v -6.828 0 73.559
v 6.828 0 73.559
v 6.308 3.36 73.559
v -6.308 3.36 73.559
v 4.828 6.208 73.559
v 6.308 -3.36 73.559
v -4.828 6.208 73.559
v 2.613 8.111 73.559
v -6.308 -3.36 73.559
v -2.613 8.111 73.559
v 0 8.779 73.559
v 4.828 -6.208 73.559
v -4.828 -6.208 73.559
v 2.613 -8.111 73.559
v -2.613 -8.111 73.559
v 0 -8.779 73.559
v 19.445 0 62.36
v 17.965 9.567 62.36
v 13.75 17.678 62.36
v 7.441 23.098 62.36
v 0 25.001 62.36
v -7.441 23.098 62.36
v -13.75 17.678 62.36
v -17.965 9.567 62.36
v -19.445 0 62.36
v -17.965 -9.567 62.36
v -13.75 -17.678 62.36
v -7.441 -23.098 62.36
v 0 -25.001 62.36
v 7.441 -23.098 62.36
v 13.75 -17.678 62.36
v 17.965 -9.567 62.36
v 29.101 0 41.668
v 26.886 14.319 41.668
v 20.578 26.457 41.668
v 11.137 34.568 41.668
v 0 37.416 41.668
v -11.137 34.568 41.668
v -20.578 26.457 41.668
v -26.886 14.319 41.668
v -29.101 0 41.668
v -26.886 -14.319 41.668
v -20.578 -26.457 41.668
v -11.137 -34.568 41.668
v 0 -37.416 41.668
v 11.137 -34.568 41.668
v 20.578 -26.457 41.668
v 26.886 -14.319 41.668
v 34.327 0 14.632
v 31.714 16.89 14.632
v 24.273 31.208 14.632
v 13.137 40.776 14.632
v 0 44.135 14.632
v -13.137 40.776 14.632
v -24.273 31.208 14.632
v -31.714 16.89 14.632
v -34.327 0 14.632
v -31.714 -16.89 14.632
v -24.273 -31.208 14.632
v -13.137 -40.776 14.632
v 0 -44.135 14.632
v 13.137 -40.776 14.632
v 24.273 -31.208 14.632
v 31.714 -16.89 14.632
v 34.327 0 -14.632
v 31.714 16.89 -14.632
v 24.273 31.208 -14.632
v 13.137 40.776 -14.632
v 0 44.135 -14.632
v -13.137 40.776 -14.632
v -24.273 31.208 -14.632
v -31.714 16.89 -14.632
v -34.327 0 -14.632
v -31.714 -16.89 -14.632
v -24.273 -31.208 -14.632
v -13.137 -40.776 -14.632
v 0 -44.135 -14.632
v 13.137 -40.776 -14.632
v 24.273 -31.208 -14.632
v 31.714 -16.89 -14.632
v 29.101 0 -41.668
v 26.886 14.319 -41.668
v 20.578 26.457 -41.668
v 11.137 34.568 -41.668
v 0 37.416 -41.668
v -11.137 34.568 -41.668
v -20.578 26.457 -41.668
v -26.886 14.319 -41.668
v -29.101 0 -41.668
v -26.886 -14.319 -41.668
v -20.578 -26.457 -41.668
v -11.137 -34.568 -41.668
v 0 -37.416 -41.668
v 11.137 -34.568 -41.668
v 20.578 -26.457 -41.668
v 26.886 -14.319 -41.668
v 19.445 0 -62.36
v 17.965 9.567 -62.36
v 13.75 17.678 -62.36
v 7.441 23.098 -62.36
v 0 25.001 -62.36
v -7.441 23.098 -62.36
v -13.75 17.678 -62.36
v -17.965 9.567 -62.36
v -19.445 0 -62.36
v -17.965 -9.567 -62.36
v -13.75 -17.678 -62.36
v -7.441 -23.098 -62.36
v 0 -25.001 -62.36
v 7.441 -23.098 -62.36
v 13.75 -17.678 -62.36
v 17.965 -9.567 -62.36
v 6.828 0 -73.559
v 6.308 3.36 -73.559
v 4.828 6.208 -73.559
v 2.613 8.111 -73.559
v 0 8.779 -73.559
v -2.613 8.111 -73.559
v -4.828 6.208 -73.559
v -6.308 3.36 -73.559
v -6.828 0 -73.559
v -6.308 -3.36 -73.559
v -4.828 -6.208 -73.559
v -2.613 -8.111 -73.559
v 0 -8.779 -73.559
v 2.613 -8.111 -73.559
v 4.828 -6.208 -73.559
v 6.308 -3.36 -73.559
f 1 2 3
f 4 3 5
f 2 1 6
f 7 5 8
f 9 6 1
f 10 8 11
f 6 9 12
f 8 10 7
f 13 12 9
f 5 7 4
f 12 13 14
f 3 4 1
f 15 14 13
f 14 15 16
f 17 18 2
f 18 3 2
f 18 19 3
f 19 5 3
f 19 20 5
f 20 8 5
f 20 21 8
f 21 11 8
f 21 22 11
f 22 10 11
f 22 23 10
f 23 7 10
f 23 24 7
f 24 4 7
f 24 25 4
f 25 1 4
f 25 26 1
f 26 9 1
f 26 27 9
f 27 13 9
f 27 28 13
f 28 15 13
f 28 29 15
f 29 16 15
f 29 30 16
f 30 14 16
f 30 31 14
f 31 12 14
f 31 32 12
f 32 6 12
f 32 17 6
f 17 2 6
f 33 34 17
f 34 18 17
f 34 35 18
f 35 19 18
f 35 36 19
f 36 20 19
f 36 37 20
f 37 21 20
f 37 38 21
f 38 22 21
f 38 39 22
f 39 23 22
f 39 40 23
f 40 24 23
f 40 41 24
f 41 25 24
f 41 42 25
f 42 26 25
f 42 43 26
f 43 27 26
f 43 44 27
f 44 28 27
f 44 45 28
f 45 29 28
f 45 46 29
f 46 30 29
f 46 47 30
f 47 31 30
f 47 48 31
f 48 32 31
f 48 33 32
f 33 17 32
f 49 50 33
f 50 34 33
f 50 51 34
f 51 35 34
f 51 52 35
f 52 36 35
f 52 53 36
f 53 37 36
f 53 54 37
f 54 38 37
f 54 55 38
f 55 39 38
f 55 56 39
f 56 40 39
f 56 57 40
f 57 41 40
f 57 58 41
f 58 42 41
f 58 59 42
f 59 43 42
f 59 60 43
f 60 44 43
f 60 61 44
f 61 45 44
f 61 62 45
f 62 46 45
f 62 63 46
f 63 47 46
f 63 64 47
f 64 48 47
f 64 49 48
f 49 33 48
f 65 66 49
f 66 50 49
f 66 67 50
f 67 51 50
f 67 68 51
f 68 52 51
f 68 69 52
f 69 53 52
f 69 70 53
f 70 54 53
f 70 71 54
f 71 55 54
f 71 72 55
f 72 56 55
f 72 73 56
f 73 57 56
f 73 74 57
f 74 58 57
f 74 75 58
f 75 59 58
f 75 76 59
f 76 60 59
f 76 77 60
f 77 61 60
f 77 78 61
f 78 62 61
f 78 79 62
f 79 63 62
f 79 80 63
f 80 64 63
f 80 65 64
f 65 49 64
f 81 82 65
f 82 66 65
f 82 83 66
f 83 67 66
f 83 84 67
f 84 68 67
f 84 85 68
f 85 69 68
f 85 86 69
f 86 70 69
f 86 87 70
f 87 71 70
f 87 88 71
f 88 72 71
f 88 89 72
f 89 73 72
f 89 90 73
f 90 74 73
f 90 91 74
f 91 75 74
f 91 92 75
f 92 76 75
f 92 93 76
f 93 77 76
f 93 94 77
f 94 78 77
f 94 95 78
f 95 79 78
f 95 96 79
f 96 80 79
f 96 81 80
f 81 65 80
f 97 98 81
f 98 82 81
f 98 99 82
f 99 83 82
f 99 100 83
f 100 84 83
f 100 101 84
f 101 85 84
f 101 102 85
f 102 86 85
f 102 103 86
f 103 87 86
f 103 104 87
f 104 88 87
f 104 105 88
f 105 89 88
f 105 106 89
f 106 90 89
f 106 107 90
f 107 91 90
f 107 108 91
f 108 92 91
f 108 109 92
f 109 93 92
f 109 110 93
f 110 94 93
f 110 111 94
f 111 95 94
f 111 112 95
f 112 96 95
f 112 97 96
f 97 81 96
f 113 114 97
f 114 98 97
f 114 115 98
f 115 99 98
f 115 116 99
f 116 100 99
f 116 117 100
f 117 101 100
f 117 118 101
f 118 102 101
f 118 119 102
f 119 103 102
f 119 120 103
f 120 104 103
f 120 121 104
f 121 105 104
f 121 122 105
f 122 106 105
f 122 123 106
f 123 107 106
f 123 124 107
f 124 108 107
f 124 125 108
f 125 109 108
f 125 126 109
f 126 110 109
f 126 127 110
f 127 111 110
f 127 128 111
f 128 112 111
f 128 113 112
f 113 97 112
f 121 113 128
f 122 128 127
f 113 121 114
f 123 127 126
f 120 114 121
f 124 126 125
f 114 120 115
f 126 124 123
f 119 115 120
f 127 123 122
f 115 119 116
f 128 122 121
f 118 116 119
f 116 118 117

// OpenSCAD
// Generated by SolidPython 1.0.1 on 2020-07-29 00:46:47


scale(v = [7, 9, 15]) {
	sphere(r = 5);
}
/***********************************************
*********      SolidPython code:      **********
************************************************
 
# import packages: SolidPython
from solid import *
from solid.utils import *
from itertools import chain, combinations, permutations


class Resize:

    def __init__(self, scad_file):
        self.scad_file = scad_file
        #self.scad_file = import_scad(scad_file)
        # cone/cylinder param:
        self.r1 = 0
        self.r2 = 0
        self.h = 0
        # rectangular prism param:
        self.w = 0
        self.l = 0
        # ellipse param:
        self.r = 0

    # import OpenScad code (file name corresponds to shape)


    # classify shape + parameters
    def assign(self, param1, param2, param3):
        if self.scad_file == 'cone.scad':
            self.r1 = param1
            self.r2 = param2
            self.h = param3
        elif self.scad_file == 'cylinder.scad':
            self.r1 = param1
            self.r2 = param2
            self.h = param3
        elif self.scad_file == 'rectangularPrism.scad':
            self.h = param1
            self.l = param2
            self.w = param3
        else:
            self.r = param1
            self.h = param2

    # resize parameters
    def iterate(self):
        x = range(3, 20, 2)
        i = 1
        if self.scad_file == 'cone.scad':
            tempList = list(permutations(x, 2))
            for temp in tempList:
                param1 = temp[0]
                param2 = temp[1]
                filepath = 'produced_scad_files/' + 'cone' + str(param1) + '_' + str(param2) + '_' + '.scad'
                scad_render_to_file(cylinder(h=param1, r1=param2, r2=0), filepath)

        elif self.scad_file == 'cylinder.scad':
            tempList = list(permutations(x, 3))
            for temp in tempList:
                param1 = temp[0]
                param2 = temp[1]
                filepath = 'produced_scad_files/' + 'cylinder' + str(param1) + '_' + str(param2) + '_' + '.scad'
                scad_render_to_file(cylinder(h=param1, r1=param2, r2=param2), filepath)

        elif self.scad_file == 'rectangularPrism.scad':
            tempList = list(permutations(x, 3))
            for temp in tempList:
                param1 = temp[0]
                param2 = temp[1]
                param3 = temp[2]
                filepath = 'produced_scad_files/' + 'rectangularPrism' + str(param1) + '_' + str(param2) + '_' + str(
                    param3) + '.scad'
                scad_render_to_file(cube(size=(param1, param2, param3)), filepath)

        elif self.scad_file == 'ellipse.scad':
            tempList = list(permutations(x, 4))
            for temp in tempList:
                param1 = temp[0]
                param2 = temp[1]
                param3 = temp[2]
                param4 = temp[3]
                filepath = 'produced_scad_files/' + 'ellipse' + str(param1) + '_' + str(param2) + '_' + str(param3) + '_' + str(param4) + '.scad'
                scad_render_to_file(scale([param1, param2, param3])(sphere(r=param4)), filepath)

    def render_to_scadfile(self):
        scad_render_to_file(scad, 'example.scad') 
 
************************************************/
